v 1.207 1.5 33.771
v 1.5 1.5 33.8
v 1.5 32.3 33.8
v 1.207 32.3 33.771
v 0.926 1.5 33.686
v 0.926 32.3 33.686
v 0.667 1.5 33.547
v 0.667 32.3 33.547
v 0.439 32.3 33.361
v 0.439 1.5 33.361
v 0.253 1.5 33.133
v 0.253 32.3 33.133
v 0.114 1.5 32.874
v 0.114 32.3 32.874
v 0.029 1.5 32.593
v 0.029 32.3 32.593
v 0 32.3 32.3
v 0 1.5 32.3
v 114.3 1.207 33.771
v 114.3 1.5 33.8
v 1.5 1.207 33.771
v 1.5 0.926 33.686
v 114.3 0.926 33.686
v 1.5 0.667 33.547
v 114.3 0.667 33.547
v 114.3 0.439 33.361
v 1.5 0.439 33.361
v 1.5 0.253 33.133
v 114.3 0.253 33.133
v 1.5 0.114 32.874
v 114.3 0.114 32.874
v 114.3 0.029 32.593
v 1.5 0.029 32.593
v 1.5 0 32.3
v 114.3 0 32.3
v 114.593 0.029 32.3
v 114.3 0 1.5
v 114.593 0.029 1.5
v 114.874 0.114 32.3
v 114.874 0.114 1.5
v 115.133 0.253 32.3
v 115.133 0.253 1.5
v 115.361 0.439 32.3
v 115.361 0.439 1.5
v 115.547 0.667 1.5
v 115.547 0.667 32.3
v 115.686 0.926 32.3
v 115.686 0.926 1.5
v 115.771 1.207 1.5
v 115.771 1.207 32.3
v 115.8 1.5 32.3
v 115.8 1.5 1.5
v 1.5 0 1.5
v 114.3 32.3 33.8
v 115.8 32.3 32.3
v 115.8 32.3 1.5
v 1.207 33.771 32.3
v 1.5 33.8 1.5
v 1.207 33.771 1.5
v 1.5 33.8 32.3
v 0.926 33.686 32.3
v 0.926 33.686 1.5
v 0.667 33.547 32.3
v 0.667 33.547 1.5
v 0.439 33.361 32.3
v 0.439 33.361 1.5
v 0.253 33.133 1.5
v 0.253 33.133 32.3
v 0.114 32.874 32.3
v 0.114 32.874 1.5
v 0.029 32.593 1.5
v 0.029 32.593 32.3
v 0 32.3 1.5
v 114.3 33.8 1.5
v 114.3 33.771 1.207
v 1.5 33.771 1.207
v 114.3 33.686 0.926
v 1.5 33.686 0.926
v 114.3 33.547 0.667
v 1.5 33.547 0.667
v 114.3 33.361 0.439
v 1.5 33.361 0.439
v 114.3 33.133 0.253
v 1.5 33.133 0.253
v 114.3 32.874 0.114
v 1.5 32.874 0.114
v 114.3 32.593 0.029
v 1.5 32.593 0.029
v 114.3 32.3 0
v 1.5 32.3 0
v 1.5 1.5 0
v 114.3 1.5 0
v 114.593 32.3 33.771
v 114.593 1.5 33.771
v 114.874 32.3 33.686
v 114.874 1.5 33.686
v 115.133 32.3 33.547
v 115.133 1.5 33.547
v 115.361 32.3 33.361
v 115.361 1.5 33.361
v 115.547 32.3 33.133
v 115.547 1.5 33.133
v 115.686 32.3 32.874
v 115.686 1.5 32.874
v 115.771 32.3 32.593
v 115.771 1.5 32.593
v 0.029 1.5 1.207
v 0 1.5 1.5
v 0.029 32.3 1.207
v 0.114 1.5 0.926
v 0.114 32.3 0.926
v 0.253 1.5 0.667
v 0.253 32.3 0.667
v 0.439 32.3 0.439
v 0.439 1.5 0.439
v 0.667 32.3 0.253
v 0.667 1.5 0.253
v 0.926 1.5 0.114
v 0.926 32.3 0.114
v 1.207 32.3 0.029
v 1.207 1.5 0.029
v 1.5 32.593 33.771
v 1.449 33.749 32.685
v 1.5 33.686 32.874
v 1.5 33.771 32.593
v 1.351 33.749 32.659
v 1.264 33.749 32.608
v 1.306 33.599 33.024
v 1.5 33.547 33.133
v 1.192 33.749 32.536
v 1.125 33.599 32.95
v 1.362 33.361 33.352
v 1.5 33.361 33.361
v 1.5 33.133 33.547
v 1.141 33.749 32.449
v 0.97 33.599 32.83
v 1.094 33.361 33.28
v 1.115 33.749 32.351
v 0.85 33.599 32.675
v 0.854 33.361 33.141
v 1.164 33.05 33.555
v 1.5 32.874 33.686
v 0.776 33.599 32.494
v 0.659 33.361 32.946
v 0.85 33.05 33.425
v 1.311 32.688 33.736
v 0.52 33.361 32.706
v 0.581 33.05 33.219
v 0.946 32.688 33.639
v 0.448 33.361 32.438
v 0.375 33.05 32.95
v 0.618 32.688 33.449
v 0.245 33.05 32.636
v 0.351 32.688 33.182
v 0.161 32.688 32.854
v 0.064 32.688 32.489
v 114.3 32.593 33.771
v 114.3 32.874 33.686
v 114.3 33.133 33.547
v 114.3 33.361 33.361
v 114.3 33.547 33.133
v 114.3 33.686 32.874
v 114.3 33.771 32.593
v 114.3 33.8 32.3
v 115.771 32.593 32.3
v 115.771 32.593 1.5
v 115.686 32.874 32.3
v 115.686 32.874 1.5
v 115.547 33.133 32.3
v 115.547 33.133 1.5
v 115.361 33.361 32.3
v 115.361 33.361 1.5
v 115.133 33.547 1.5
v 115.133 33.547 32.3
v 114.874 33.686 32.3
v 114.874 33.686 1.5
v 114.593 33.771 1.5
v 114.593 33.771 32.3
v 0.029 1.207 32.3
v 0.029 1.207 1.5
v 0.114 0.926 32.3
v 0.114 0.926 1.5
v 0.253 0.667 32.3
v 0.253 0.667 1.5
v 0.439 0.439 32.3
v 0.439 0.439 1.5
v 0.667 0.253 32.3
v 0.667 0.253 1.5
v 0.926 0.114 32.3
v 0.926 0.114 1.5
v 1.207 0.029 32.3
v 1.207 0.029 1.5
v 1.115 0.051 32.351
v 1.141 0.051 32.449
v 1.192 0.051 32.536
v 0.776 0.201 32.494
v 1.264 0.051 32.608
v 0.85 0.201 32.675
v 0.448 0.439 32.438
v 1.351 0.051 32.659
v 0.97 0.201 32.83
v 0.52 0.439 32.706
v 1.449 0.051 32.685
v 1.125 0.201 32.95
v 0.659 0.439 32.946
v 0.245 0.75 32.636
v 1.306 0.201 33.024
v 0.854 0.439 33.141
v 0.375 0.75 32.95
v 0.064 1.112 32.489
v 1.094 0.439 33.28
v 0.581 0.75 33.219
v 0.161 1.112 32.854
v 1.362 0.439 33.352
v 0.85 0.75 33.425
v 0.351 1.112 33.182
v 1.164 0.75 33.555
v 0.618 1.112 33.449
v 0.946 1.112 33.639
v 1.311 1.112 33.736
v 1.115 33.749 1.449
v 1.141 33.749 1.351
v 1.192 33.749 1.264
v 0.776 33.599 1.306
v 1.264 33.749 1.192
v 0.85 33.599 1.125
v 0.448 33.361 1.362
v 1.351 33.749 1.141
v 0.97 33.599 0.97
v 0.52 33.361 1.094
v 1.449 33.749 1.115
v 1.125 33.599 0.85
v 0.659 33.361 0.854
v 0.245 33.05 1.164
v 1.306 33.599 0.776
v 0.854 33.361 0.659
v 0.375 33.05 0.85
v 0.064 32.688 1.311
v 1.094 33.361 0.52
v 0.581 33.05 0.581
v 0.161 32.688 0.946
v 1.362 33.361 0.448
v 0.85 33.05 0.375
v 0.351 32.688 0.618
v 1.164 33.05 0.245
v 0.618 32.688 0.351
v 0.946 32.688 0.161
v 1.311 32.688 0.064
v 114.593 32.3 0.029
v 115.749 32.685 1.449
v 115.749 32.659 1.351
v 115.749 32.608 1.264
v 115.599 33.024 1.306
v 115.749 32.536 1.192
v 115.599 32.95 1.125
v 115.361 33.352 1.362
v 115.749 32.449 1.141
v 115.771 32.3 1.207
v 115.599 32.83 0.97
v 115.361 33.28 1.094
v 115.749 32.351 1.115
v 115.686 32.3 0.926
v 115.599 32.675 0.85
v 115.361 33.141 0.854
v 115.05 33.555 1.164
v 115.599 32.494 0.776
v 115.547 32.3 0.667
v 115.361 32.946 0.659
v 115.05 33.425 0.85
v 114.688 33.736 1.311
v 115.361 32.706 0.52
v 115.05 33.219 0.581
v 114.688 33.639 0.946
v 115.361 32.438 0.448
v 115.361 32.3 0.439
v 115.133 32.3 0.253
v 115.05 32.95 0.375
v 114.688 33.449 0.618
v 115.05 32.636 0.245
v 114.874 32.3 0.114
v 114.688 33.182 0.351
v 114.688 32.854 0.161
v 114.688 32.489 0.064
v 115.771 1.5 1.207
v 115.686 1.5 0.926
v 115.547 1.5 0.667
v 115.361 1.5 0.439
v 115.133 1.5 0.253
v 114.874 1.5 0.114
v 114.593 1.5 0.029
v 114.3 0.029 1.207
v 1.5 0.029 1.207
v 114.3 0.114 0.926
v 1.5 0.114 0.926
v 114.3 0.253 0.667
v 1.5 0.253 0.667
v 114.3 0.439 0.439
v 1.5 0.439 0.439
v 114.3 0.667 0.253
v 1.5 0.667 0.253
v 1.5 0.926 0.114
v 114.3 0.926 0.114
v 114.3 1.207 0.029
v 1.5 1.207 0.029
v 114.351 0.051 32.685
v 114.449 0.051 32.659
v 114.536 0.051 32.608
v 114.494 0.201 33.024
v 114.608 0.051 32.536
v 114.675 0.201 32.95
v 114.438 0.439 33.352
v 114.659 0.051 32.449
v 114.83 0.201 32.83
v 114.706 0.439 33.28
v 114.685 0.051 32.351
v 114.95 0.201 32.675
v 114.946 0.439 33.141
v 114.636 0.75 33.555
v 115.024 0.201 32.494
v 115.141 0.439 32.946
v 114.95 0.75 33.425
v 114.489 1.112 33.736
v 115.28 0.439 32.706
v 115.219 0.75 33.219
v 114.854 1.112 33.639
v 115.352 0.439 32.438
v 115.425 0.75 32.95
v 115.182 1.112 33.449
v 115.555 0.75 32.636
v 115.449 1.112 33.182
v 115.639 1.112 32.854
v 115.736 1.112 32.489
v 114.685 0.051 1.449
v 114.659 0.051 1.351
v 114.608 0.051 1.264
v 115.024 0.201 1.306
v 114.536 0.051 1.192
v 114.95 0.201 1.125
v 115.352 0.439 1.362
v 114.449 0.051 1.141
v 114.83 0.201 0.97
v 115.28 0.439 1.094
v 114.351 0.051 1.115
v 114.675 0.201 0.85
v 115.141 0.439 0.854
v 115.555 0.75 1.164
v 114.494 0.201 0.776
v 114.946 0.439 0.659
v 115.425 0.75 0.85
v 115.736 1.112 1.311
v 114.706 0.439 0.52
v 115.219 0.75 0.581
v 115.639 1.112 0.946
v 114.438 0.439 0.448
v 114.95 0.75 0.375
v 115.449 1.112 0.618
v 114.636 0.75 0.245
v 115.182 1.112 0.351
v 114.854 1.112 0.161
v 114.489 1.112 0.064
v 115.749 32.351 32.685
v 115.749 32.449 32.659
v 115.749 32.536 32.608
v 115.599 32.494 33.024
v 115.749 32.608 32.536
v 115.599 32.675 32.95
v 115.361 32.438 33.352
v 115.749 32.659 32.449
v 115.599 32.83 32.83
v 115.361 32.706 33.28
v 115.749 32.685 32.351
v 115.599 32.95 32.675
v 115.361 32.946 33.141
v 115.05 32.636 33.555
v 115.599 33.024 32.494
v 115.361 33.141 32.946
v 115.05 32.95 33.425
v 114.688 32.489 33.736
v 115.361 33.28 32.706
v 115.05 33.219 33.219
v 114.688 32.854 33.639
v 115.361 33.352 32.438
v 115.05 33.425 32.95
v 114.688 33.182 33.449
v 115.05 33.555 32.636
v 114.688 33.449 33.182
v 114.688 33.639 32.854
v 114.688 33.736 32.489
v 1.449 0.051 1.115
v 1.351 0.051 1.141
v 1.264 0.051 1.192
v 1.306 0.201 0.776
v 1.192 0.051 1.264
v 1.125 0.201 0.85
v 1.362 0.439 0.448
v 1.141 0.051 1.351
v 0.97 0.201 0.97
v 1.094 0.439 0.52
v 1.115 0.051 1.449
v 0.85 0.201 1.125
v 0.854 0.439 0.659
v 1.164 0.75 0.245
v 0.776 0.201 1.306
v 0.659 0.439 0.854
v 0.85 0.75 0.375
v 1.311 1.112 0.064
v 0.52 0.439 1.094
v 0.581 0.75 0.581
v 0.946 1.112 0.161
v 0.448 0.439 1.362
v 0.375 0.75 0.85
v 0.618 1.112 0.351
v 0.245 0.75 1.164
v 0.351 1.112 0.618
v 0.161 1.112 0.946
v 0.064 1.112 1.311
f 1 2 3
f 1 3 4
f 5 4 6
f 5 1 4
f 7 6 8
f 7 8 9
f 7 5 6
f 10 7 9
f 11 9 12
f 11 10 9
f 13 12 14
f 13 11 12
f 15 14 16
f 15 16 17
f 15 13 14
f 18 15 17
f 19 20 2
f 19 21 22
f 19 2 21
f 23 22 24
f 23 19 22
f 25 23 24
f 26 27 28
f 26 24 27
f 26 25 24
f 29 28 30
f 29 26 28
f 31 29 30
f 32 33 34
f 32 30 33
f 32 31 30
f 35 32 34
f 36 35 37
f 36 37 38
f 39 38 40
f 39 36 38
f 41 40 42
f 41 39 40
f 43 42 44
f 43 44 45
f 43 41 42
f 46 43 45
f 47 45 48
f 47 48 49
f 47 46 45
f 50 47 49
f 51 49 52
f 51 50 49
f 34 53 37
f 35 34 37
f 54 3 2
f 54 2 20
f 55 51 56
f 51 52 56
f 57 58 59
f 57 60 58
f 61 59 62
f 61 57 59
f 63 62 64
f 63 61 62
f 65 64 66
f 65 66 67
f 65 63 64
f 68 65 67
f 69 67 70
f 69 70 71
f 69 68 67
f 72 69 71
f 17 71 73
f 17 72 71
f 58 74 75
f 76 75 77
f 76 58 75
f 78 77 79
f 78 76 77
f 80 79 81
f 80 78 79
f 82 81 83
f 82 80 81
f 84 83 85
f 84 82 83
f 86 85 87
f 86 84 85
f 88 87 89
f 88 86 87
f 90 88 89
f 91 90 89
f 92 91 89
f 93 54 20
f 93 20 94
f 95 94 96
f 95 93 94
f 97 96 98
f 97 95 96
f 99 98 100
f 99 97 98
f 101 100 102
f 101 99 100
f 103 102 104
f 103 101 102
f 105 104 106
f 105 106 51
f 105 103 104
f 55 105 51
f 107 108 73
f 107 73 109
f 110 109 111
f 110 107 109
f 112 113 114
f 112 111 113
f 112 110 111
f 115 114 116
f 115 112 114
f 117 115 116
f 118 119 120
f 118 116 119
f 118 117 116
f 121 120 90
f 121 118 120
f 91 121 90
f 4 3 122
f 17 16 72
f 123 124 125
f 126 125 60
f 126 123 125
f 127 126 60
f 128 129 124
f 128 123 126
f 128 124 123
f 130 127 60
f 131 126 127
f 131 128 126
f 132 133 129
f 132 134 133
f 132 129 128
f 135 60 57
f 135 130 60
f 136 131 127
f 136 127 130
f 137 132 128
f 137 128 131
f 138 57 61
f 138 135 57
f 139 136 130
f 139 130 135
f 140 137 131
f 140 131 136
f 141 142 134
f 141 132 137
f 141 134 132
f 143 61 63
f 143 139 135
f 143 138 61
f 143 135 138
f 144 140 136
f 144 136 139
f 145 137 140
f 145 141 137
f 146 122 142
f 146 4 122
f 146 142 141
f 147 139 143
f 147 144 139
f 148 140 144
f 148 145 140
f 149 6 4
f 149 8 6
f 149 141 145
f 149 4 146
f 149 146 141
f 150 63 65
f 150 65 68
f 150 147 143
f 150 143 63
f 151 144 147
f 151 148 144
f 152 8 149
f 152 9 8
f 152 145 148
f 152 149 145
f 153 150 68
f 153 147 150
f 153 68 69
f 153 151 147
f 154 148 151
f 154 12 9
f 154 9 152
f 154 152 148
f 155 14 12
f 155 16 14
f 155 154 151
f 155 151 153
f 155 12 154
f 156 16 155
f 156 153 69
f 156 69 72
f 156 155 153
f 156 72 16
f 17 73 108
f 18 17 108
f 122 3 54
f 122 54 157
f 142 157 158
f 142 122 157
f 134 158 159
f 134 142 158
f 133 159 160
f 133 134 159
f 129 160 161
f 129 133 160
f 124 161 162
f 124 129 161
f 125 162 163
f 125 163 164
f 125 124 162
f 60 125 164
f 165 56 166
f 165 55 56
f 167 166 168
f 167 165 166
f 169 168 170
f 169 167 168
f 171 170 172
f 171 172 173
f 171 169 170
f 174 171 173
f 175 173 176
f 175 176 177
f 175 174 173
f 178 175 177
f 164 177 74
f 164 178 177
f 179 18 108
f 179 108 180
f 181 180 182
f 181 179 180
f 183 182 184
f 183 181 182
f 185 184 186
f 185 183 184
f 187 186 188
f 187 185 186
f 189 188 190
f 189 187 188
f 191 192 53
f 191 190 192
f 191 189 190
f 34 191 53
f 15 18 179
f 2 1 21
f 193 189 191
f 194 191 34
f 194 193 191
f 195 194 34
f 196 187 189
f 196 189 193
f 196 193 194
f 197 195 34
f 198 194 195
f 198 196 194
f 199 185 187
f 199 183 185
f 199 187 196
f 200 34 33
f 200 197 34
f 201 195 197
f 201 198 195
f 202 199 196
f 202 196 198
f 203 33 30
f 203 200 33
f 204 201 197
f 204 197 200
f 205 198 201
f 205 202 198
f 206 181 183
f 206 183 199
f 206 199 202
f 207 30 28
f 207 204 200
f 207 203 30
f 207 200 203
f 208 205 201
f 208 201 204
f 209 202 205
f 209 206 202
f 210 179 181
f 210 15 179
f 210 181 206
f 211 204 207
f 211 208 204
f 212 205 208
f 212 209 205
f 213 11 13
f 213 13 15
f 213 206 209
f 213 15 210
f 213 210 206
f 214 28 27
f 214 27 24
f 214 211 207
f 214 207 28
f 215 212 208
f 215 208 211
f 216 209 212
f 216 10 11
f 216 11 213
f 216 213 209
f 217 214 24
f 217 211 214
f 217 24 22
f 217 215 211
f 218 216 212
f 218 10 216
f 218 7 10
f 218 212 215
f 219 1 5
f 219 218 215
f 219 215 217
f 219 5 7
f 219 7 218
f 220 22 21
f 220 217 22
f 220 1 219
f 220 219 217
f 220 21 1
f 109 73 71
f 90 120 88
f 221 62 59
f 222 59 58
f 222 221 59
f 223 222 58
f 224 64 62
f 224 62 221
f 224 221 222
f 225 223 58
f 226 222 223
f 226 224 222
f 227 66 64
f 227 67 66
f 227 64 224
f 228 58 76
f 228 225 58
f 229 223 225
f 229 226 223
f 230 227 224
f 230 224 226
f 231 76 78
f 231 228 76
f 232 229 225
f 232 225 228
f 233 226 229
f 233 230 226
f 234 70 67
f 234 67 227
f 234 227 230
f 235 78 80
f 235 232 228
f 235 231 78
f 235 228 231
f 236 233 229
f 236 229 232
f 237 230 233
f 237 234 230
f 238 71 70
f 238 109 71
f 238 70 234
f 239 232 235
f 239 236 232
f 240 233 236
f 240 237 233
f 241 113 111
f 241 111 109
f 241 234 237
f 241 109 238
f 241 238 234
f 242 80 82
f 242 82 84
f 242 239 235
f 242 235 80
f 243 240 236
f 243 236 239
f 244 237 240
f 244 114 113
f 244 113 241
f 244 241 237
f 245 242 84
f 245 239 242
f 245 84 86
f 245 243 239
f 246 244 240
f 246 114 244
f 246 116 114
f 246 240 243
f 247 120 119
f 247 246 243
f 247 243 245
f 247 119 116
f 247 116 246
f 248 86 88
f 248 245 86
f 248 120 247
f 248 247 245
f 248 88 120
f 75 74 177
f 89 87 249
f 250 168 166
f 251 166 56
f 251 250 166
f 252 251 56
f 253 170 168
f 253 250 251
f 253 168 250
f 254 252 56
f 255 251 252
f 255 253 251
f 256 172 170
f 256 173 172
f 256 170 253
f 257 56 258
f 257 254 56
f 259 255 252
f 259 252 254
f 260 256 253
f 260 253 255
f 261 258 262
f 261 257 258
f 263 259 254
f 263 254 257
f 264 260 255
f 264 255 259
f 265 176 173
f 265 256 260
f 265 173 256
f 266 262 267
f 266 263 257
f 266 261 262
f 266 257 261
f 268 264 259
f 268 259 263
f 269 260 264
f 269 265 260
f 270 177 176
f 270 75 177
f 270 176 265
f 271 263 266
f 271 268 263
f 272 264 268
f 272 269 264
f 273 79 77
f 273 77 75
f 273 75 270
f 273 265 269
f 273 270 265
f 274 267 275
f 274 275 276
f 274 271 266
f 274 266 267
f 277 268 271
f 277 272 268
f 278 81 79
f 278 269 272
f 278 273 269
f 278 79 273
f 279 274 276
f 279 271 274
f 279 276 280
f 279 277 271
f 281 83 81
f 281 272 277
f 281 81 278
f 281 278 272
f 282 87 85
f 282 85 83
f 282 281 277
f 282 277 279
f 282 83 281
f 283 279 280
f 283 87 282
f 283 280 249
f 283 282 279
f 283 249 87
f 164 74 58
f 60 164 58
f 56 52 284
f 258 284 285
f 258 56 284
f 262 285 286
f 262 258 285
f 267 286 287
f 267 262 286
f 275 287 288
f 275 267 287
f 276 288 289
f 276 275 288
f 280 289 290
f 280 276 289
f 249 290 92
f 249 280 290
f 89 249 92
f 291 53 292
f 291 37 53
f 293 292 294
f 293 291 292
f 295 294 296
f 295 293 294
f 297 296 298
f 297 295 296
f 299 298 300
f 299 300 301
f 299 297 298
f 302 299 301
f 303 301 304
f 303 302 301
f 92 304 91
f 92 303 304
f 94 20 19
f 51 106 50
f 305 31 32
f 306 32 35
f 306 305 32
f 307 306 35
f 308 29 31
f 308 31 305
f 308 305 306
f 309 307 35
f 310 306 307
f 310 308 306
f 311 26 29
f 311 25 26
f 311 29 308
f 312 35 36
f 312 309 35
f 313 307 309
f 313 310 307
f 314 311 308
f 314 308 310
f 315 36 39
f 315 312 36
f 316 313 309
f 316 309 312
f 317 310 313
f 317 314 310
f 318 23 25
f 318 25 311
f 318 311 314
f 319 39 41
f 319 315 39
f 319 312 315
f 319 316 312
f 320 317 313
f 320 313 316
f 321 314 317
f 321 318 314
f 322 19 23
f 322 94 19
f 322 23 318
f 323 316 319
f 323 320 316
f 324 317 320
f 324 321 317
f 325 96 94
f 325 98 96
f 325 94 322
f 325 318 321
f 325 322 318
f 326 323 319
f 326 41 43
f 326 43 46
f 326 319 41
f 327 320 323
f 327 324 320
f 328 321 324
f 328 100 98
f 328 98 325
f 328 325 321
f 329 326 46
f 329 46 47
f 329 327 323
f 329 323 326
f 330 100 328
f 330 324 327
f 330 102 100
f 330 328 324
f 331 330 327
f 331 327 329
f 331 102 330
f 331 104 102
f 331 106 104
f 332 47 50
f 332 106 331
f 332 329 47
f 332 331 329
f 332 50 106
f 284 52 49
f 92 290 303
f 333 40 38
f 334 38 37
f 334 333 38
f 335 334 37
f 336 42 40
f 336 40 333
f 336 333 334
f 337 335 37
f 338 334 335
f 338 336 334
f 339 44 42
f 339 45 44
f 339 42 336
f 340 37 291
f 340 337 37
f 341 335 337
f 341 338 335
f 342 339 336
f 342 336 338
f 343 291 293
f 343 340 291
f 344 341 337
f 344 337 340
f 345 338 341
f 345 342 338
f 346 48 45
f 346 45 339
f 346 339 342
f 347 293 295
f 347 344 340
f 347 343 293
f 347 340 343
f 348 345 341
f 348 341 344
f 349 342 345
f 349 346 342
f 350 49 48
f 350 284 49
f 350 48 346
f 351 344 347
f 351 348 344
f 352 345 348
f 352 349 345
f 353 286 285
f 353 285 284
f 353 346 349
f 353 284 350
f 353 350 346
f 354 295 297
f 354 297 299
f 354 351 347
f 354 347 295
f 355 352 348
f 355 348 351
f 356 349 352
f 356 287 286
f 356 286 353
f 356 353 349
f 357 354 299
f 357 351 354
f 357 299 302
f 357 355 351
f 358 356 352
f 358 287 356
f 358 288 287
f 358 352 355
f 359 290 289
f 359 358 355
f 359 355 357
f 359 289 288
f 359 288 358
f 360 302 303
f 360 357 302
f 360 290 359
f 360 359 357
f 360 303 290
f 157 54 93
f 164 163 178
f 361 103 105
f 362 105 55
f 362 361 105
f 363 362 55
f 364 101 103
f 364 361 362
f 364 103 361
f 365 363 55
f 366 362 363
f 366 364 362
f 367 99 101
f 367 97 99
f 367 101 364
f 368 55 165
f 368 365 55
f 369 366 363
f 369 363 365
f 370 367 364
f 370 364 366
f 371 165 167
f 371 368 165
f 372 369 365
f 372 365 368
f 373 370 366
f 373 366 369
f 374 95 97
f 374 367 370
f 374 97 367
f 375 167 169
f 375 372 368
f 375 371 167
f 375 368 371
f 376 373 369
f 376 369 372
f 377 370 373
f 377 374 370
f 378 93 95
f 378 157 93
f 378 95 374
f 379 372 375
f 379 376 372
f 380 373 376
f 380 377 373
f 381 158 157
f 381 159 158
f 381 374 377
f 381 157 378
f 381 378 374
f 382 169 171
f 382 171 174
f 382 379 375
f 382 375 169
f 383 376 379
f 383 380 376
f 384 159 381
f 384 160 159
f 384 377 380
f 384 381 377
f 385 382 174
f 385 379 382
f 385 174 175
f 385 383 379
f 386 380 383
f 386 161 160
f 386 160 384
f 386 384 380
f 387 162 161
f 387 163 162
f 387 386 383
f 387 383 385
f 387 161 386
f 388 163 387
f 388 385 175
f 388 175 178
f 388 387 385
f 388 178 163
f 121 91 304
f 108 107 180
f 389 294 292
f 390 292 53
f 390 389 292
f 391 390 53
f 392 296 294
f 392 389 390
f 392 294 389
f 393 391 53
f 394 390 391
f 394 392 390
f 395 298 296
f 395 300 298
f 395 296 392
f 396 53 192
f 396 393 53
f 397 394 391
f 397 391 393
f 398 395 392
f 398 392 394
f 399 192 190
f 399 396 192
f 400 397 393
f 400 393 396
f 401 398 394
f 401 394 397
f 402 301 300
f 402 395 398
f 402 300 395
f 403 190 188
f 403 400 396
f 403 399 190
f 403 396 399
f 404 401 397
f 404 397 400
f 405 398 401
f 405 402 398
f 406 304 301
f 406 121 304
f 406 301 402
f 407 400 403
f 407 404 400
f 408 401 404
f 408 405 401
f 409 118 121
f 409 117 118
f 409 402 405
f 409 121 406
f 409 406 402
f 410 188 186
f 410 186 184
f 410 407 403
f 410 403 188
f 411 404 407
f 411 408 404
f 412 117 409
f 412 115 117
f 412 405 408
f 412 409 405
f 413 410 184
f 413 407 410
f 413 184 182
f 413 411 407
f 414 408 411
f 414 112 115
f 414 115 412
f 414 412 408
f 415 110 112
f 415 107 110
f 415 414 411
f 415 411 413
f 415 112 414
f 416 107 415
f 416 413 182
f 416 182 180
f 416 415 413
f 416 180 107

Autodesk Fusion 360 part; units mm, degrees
sketch "スケッチ1" plane through (0, 0, 0) normal (0, 0, 1) x (1, 0, 0)
  line L0 (0, 0) -> (115.8, 0)
  line L1 (115.8, 0) -> (115.8, 33.8)
  line L2 (115.8, 33.8) -> (0, 33.8)
  line L3 (0, 33.8) -> (0, 0)
  dimension "d1" = 115.8
  dimension "d2" = 33.8
extrude "押し出し1" add sketch "スケッチ1" along normal blind 33.8
fillet "フィレット1" radius 1.5 4 faces at (38.6, 22.5333, 33.8) (38.6, 22.5333, 0) (38.6, 0, 11.2667) (77.2, 33.8, 11.2667)
